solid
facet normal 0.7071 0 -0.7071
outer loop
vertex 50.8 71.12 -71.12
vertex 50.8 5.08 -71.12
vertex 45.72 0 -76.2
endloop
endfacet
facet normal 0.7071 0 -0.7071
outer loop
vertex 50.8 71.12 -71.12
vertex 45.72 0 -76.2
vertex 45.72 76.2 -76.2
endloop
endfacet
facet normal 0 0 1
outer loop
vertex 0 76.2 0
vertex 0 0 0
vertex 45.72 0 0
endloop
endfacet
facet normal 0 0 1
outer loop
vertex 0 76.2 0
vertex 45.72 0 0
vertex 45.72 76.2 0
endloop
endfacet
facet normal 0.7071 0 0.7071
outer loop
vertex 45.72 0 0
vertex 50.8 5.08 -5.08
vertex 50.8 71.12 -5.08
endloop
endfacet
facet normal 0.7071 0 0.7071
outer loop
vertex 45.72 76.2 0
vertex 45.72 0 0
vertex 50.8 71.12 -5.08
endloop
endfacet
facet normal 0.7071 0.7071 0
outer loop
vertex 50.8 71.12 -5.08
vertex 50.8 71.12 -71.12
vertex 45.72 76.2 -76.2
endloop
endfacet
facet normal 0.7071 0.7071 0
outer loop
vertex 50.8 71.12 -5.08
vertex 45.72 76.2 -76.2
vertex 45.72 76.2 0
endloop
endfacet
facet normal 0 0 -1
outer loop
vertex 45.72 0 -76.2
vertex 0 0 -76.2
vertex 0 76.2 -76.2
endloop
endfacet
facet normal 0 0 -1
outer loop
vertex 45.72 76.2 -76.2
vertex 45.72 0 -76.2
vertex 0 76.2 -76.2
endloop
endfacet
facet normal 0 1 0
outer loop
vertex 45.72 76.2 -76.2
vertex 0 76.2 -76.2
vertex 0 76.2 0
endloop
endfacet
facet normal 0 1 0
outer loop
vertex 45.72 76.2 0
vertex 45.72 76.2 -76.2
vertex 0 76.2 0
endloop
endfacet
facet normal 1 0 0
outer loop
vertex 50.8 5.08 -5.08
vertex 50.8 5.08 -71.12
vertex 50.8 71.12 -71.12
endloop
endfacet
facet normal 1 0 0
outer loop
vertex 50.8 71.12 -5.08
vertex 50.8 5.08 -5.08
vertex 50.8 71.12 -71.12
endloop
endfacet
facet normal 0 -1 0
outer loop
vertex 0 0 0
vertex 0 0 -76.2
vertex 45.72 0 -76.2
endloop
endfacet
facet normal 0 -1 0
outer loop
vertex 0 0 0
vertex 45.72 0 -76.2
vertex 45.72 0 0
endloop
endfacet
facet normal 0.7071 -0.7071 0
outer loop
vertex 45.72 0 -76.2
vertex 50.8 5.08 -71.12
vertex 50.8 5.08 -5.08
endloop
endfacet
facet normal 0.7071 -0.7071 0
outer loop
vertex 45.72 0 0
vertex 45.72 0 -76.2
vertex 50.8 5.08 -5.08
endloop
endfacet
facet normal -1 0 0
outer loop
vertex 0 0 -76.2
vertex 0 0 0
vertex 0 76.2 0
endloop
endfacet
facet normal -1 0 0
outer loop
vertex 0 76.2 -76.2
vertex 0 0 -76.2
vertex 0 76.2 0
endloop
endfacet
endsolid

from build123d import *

# Parameters (mm, degrees)
F0_W     = 76.2
F0_H     = 76.2
F1_DEPTH = 50.8
F2_SIZE  = 5.08


with BuildPart() as f1:
    # F0 (on Right) → F1 (new body)
    with BuildSketch(Plane.YZ):
        with Locations((38.1, -38.1)):
            Rectangle(F0_W, F0_H)
    extrude(amount=F1_DEPTH)

    # F2
    f2_edges = [f1.edges().sort_by_distance(p)[0] for p in [
        (50.8, 38.1, 0),
        (50.8, 0, -38.1),
        (50.8, 76.2, -38.1),
        (50.8, 38.1, -76.2),
    ]]
    chamfer(f2_edges, length=F2_SIZE)


solid = f1.part
